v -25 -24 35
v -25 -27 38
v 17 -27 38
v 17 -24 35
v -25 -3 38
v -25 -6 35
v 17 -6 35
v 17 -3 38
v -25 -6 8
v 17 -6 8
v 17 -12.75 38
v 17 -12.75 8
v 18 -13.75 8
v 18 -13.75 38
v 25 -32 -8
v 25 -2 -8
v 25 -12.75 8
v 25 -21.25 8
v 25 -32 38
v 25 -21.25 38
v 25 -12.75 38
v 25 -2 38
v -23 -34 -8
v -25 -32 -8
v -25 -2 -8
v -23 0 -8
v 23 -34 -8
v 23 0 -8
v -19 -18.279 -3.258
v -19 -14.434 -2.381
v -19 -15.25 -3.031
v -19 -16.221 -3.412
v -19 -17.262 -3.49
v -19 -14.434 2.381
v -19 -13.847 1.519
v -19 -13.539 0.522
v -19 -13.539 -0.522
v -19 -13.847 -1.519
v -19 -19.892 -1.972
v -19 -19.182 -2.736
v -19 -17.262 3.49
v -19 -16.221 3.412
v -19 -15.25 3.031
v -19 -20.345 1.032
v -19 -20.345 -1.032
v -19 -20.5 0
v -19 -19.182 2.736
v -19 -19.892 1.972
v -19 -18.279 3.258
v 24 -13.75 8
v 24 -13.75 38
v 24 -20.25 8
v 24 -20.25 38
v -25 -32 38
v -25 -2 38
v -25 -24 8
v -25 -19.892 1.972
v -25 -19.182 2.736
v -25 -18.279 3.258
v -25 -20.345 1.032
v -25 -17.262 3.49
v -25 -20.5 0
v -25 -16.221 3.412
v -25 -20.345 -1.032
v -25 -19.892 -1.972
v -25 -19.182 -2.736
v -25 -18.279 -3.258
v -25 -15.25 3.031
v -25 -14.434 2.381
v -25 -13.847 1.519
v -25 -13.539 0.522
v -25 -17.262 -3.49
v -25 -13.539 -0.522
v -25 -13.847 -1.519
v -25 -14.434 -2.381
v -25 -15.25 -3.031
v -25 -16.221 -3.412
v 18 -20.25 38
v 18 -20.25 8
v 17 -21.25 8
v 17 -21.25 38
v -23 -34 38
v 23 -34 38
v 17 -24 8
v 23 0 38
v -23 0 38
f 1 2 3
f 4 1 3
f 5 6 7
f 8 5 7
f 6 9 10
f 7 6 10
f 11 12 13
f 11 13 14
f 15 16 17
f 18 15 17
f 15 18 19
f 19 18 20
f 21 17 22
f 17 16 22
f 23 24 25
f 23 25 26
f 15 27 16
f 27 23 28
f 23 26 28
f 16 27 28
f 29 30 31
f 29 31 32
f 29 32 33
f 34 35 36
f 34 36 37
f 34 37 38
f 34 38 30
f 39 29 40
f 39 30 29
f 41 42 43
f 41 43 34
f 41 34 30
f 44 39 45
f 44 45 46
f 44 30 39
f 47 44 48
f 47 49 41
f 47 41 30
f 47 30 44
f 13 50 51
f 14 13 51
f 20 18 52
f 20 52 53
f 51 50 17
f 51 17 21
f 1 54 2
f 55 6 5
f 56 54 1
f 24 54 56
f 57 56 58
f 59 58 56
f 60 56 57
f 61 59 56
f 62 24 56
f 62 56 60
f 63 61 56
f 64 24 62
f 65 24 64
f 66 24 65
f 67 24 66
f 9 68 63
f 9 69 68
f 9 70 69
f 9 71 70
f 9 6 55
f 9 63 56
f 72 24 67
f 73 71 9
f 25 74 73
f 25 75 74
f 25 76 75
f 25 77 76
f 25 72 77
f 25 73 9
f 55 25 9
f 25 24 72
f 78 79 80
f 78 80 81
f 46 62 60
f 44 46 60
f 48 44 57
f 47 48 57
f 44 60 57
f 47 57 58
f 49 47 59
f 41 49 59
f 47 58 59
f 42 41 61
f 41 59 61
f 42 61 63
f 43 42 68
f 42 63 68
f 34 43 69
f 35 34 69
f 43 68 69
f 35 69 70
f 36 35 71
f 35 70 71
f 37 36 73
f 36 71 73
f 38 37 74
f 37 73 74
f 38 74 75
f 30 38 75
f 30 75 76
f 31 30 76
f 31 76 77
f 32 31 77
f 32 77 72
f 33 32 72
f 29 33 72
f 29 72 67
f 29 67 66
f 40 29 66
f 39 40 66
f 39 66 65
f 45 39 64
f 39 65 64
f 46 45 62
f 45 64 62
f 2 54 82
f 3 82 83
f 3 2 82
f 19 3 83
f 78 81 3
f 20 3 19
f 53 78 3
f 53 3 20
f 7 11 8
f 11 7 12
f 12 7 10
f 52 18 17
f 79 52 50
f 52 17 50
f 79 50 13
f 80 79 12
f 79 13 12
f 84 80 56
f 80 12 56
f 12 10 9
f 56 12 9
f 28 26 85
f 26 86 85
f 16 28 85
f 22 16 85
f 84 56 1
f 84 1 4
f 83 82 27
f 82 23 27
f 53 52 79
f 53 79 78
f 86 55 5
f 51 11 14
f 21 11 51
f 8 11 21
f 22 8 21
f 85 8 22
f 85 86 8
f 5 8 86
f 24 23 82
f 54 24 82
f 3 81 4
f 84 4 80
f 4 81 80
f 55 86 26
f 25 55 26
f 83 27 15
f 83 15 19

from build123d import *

# Parameters (mm, degrees)
F1_DEPTH = 34
F2_W     = 6.5
F2_H     = 30
F3_DEPTH = 8
F4_R     = 3.5
F5_DEPTH = 6
F6_W     = 42
F6_H     = 10
F6_H_2   = 6
F7_DEPTH = 30
F8_SIZE  = 3
F9_SIZE  = 2
F10_SIZE = 1


with BuildPart() as f1:
    # F0 (on Front) → F1 (new body)
    with BuildSketch(Plane.XZ):
        Polygon((-20, 8), (-25, 8), (-25, -8), (25, -8), (25, 38), (17, 38), (17, 8), align=None)
    extrude(amount=F1_DEPTH)

    # F2 (on face) → F3 (cut, through all)
    with BuildSketch(Plane.YZ.offset(25)):
        with Locations((-17, 23)):
            Rectangle(F2_W, F2_H)
    extrude(amount=-F3_DEPTH, mode=Mode.SUBTRACT)

    # F4 (on face) → F5 (cut)
    with BuildSketch(Plane(origin=(-25, 0, 0), x_dir=(0, -1, 0), z_dir=(-1, 0, 0))):
        with Locations((17, 0)):
            Circle(F4_R)
    extrude(amount=-F5_DEPTH, mode=Mode.SUBTRACT)

    # F6 (on face) → F7 (join, through all)
    with BuildSketch(Plane.XY.offset(8)):
        with Locations((-4, -29)):
            Rectangle(F6_W, F6_H)
        with Locations((-4, -3)):
            Rectangle(F6_W, F6_H_2)
    extrude(amount=F7_DEPTH)

    # F8
    f8_edges = [f1.edges().sort_by_distance(p)[0] for p in [
        (-4, -24, 38),
        (-4, -6, 38),
    ]]
    chamfer(f8_edges, length=F8_SIZE)

    # F9
    f9_edges = [f1.edges().sort_by_distance(p)[0] for p in [
        (25, -34, 15),
        (25, 0, 15),
        (-25, -34, 15),
        (-25, 0, 15),
    ]]
    chamfer(f9_edges, length=F9_SIZE)

    # F10
    f10_edges = [f1.edges().sort_by_distance(p)[0] for p in [
        (17, -13.75, 23),
        (17, -20.25, 23),
        (25, -13.75, 23),
        (25, -20.25, 23),
    ]]
    chamfer(f10_edges, length=F10_SIZE)


solid = f1.part
